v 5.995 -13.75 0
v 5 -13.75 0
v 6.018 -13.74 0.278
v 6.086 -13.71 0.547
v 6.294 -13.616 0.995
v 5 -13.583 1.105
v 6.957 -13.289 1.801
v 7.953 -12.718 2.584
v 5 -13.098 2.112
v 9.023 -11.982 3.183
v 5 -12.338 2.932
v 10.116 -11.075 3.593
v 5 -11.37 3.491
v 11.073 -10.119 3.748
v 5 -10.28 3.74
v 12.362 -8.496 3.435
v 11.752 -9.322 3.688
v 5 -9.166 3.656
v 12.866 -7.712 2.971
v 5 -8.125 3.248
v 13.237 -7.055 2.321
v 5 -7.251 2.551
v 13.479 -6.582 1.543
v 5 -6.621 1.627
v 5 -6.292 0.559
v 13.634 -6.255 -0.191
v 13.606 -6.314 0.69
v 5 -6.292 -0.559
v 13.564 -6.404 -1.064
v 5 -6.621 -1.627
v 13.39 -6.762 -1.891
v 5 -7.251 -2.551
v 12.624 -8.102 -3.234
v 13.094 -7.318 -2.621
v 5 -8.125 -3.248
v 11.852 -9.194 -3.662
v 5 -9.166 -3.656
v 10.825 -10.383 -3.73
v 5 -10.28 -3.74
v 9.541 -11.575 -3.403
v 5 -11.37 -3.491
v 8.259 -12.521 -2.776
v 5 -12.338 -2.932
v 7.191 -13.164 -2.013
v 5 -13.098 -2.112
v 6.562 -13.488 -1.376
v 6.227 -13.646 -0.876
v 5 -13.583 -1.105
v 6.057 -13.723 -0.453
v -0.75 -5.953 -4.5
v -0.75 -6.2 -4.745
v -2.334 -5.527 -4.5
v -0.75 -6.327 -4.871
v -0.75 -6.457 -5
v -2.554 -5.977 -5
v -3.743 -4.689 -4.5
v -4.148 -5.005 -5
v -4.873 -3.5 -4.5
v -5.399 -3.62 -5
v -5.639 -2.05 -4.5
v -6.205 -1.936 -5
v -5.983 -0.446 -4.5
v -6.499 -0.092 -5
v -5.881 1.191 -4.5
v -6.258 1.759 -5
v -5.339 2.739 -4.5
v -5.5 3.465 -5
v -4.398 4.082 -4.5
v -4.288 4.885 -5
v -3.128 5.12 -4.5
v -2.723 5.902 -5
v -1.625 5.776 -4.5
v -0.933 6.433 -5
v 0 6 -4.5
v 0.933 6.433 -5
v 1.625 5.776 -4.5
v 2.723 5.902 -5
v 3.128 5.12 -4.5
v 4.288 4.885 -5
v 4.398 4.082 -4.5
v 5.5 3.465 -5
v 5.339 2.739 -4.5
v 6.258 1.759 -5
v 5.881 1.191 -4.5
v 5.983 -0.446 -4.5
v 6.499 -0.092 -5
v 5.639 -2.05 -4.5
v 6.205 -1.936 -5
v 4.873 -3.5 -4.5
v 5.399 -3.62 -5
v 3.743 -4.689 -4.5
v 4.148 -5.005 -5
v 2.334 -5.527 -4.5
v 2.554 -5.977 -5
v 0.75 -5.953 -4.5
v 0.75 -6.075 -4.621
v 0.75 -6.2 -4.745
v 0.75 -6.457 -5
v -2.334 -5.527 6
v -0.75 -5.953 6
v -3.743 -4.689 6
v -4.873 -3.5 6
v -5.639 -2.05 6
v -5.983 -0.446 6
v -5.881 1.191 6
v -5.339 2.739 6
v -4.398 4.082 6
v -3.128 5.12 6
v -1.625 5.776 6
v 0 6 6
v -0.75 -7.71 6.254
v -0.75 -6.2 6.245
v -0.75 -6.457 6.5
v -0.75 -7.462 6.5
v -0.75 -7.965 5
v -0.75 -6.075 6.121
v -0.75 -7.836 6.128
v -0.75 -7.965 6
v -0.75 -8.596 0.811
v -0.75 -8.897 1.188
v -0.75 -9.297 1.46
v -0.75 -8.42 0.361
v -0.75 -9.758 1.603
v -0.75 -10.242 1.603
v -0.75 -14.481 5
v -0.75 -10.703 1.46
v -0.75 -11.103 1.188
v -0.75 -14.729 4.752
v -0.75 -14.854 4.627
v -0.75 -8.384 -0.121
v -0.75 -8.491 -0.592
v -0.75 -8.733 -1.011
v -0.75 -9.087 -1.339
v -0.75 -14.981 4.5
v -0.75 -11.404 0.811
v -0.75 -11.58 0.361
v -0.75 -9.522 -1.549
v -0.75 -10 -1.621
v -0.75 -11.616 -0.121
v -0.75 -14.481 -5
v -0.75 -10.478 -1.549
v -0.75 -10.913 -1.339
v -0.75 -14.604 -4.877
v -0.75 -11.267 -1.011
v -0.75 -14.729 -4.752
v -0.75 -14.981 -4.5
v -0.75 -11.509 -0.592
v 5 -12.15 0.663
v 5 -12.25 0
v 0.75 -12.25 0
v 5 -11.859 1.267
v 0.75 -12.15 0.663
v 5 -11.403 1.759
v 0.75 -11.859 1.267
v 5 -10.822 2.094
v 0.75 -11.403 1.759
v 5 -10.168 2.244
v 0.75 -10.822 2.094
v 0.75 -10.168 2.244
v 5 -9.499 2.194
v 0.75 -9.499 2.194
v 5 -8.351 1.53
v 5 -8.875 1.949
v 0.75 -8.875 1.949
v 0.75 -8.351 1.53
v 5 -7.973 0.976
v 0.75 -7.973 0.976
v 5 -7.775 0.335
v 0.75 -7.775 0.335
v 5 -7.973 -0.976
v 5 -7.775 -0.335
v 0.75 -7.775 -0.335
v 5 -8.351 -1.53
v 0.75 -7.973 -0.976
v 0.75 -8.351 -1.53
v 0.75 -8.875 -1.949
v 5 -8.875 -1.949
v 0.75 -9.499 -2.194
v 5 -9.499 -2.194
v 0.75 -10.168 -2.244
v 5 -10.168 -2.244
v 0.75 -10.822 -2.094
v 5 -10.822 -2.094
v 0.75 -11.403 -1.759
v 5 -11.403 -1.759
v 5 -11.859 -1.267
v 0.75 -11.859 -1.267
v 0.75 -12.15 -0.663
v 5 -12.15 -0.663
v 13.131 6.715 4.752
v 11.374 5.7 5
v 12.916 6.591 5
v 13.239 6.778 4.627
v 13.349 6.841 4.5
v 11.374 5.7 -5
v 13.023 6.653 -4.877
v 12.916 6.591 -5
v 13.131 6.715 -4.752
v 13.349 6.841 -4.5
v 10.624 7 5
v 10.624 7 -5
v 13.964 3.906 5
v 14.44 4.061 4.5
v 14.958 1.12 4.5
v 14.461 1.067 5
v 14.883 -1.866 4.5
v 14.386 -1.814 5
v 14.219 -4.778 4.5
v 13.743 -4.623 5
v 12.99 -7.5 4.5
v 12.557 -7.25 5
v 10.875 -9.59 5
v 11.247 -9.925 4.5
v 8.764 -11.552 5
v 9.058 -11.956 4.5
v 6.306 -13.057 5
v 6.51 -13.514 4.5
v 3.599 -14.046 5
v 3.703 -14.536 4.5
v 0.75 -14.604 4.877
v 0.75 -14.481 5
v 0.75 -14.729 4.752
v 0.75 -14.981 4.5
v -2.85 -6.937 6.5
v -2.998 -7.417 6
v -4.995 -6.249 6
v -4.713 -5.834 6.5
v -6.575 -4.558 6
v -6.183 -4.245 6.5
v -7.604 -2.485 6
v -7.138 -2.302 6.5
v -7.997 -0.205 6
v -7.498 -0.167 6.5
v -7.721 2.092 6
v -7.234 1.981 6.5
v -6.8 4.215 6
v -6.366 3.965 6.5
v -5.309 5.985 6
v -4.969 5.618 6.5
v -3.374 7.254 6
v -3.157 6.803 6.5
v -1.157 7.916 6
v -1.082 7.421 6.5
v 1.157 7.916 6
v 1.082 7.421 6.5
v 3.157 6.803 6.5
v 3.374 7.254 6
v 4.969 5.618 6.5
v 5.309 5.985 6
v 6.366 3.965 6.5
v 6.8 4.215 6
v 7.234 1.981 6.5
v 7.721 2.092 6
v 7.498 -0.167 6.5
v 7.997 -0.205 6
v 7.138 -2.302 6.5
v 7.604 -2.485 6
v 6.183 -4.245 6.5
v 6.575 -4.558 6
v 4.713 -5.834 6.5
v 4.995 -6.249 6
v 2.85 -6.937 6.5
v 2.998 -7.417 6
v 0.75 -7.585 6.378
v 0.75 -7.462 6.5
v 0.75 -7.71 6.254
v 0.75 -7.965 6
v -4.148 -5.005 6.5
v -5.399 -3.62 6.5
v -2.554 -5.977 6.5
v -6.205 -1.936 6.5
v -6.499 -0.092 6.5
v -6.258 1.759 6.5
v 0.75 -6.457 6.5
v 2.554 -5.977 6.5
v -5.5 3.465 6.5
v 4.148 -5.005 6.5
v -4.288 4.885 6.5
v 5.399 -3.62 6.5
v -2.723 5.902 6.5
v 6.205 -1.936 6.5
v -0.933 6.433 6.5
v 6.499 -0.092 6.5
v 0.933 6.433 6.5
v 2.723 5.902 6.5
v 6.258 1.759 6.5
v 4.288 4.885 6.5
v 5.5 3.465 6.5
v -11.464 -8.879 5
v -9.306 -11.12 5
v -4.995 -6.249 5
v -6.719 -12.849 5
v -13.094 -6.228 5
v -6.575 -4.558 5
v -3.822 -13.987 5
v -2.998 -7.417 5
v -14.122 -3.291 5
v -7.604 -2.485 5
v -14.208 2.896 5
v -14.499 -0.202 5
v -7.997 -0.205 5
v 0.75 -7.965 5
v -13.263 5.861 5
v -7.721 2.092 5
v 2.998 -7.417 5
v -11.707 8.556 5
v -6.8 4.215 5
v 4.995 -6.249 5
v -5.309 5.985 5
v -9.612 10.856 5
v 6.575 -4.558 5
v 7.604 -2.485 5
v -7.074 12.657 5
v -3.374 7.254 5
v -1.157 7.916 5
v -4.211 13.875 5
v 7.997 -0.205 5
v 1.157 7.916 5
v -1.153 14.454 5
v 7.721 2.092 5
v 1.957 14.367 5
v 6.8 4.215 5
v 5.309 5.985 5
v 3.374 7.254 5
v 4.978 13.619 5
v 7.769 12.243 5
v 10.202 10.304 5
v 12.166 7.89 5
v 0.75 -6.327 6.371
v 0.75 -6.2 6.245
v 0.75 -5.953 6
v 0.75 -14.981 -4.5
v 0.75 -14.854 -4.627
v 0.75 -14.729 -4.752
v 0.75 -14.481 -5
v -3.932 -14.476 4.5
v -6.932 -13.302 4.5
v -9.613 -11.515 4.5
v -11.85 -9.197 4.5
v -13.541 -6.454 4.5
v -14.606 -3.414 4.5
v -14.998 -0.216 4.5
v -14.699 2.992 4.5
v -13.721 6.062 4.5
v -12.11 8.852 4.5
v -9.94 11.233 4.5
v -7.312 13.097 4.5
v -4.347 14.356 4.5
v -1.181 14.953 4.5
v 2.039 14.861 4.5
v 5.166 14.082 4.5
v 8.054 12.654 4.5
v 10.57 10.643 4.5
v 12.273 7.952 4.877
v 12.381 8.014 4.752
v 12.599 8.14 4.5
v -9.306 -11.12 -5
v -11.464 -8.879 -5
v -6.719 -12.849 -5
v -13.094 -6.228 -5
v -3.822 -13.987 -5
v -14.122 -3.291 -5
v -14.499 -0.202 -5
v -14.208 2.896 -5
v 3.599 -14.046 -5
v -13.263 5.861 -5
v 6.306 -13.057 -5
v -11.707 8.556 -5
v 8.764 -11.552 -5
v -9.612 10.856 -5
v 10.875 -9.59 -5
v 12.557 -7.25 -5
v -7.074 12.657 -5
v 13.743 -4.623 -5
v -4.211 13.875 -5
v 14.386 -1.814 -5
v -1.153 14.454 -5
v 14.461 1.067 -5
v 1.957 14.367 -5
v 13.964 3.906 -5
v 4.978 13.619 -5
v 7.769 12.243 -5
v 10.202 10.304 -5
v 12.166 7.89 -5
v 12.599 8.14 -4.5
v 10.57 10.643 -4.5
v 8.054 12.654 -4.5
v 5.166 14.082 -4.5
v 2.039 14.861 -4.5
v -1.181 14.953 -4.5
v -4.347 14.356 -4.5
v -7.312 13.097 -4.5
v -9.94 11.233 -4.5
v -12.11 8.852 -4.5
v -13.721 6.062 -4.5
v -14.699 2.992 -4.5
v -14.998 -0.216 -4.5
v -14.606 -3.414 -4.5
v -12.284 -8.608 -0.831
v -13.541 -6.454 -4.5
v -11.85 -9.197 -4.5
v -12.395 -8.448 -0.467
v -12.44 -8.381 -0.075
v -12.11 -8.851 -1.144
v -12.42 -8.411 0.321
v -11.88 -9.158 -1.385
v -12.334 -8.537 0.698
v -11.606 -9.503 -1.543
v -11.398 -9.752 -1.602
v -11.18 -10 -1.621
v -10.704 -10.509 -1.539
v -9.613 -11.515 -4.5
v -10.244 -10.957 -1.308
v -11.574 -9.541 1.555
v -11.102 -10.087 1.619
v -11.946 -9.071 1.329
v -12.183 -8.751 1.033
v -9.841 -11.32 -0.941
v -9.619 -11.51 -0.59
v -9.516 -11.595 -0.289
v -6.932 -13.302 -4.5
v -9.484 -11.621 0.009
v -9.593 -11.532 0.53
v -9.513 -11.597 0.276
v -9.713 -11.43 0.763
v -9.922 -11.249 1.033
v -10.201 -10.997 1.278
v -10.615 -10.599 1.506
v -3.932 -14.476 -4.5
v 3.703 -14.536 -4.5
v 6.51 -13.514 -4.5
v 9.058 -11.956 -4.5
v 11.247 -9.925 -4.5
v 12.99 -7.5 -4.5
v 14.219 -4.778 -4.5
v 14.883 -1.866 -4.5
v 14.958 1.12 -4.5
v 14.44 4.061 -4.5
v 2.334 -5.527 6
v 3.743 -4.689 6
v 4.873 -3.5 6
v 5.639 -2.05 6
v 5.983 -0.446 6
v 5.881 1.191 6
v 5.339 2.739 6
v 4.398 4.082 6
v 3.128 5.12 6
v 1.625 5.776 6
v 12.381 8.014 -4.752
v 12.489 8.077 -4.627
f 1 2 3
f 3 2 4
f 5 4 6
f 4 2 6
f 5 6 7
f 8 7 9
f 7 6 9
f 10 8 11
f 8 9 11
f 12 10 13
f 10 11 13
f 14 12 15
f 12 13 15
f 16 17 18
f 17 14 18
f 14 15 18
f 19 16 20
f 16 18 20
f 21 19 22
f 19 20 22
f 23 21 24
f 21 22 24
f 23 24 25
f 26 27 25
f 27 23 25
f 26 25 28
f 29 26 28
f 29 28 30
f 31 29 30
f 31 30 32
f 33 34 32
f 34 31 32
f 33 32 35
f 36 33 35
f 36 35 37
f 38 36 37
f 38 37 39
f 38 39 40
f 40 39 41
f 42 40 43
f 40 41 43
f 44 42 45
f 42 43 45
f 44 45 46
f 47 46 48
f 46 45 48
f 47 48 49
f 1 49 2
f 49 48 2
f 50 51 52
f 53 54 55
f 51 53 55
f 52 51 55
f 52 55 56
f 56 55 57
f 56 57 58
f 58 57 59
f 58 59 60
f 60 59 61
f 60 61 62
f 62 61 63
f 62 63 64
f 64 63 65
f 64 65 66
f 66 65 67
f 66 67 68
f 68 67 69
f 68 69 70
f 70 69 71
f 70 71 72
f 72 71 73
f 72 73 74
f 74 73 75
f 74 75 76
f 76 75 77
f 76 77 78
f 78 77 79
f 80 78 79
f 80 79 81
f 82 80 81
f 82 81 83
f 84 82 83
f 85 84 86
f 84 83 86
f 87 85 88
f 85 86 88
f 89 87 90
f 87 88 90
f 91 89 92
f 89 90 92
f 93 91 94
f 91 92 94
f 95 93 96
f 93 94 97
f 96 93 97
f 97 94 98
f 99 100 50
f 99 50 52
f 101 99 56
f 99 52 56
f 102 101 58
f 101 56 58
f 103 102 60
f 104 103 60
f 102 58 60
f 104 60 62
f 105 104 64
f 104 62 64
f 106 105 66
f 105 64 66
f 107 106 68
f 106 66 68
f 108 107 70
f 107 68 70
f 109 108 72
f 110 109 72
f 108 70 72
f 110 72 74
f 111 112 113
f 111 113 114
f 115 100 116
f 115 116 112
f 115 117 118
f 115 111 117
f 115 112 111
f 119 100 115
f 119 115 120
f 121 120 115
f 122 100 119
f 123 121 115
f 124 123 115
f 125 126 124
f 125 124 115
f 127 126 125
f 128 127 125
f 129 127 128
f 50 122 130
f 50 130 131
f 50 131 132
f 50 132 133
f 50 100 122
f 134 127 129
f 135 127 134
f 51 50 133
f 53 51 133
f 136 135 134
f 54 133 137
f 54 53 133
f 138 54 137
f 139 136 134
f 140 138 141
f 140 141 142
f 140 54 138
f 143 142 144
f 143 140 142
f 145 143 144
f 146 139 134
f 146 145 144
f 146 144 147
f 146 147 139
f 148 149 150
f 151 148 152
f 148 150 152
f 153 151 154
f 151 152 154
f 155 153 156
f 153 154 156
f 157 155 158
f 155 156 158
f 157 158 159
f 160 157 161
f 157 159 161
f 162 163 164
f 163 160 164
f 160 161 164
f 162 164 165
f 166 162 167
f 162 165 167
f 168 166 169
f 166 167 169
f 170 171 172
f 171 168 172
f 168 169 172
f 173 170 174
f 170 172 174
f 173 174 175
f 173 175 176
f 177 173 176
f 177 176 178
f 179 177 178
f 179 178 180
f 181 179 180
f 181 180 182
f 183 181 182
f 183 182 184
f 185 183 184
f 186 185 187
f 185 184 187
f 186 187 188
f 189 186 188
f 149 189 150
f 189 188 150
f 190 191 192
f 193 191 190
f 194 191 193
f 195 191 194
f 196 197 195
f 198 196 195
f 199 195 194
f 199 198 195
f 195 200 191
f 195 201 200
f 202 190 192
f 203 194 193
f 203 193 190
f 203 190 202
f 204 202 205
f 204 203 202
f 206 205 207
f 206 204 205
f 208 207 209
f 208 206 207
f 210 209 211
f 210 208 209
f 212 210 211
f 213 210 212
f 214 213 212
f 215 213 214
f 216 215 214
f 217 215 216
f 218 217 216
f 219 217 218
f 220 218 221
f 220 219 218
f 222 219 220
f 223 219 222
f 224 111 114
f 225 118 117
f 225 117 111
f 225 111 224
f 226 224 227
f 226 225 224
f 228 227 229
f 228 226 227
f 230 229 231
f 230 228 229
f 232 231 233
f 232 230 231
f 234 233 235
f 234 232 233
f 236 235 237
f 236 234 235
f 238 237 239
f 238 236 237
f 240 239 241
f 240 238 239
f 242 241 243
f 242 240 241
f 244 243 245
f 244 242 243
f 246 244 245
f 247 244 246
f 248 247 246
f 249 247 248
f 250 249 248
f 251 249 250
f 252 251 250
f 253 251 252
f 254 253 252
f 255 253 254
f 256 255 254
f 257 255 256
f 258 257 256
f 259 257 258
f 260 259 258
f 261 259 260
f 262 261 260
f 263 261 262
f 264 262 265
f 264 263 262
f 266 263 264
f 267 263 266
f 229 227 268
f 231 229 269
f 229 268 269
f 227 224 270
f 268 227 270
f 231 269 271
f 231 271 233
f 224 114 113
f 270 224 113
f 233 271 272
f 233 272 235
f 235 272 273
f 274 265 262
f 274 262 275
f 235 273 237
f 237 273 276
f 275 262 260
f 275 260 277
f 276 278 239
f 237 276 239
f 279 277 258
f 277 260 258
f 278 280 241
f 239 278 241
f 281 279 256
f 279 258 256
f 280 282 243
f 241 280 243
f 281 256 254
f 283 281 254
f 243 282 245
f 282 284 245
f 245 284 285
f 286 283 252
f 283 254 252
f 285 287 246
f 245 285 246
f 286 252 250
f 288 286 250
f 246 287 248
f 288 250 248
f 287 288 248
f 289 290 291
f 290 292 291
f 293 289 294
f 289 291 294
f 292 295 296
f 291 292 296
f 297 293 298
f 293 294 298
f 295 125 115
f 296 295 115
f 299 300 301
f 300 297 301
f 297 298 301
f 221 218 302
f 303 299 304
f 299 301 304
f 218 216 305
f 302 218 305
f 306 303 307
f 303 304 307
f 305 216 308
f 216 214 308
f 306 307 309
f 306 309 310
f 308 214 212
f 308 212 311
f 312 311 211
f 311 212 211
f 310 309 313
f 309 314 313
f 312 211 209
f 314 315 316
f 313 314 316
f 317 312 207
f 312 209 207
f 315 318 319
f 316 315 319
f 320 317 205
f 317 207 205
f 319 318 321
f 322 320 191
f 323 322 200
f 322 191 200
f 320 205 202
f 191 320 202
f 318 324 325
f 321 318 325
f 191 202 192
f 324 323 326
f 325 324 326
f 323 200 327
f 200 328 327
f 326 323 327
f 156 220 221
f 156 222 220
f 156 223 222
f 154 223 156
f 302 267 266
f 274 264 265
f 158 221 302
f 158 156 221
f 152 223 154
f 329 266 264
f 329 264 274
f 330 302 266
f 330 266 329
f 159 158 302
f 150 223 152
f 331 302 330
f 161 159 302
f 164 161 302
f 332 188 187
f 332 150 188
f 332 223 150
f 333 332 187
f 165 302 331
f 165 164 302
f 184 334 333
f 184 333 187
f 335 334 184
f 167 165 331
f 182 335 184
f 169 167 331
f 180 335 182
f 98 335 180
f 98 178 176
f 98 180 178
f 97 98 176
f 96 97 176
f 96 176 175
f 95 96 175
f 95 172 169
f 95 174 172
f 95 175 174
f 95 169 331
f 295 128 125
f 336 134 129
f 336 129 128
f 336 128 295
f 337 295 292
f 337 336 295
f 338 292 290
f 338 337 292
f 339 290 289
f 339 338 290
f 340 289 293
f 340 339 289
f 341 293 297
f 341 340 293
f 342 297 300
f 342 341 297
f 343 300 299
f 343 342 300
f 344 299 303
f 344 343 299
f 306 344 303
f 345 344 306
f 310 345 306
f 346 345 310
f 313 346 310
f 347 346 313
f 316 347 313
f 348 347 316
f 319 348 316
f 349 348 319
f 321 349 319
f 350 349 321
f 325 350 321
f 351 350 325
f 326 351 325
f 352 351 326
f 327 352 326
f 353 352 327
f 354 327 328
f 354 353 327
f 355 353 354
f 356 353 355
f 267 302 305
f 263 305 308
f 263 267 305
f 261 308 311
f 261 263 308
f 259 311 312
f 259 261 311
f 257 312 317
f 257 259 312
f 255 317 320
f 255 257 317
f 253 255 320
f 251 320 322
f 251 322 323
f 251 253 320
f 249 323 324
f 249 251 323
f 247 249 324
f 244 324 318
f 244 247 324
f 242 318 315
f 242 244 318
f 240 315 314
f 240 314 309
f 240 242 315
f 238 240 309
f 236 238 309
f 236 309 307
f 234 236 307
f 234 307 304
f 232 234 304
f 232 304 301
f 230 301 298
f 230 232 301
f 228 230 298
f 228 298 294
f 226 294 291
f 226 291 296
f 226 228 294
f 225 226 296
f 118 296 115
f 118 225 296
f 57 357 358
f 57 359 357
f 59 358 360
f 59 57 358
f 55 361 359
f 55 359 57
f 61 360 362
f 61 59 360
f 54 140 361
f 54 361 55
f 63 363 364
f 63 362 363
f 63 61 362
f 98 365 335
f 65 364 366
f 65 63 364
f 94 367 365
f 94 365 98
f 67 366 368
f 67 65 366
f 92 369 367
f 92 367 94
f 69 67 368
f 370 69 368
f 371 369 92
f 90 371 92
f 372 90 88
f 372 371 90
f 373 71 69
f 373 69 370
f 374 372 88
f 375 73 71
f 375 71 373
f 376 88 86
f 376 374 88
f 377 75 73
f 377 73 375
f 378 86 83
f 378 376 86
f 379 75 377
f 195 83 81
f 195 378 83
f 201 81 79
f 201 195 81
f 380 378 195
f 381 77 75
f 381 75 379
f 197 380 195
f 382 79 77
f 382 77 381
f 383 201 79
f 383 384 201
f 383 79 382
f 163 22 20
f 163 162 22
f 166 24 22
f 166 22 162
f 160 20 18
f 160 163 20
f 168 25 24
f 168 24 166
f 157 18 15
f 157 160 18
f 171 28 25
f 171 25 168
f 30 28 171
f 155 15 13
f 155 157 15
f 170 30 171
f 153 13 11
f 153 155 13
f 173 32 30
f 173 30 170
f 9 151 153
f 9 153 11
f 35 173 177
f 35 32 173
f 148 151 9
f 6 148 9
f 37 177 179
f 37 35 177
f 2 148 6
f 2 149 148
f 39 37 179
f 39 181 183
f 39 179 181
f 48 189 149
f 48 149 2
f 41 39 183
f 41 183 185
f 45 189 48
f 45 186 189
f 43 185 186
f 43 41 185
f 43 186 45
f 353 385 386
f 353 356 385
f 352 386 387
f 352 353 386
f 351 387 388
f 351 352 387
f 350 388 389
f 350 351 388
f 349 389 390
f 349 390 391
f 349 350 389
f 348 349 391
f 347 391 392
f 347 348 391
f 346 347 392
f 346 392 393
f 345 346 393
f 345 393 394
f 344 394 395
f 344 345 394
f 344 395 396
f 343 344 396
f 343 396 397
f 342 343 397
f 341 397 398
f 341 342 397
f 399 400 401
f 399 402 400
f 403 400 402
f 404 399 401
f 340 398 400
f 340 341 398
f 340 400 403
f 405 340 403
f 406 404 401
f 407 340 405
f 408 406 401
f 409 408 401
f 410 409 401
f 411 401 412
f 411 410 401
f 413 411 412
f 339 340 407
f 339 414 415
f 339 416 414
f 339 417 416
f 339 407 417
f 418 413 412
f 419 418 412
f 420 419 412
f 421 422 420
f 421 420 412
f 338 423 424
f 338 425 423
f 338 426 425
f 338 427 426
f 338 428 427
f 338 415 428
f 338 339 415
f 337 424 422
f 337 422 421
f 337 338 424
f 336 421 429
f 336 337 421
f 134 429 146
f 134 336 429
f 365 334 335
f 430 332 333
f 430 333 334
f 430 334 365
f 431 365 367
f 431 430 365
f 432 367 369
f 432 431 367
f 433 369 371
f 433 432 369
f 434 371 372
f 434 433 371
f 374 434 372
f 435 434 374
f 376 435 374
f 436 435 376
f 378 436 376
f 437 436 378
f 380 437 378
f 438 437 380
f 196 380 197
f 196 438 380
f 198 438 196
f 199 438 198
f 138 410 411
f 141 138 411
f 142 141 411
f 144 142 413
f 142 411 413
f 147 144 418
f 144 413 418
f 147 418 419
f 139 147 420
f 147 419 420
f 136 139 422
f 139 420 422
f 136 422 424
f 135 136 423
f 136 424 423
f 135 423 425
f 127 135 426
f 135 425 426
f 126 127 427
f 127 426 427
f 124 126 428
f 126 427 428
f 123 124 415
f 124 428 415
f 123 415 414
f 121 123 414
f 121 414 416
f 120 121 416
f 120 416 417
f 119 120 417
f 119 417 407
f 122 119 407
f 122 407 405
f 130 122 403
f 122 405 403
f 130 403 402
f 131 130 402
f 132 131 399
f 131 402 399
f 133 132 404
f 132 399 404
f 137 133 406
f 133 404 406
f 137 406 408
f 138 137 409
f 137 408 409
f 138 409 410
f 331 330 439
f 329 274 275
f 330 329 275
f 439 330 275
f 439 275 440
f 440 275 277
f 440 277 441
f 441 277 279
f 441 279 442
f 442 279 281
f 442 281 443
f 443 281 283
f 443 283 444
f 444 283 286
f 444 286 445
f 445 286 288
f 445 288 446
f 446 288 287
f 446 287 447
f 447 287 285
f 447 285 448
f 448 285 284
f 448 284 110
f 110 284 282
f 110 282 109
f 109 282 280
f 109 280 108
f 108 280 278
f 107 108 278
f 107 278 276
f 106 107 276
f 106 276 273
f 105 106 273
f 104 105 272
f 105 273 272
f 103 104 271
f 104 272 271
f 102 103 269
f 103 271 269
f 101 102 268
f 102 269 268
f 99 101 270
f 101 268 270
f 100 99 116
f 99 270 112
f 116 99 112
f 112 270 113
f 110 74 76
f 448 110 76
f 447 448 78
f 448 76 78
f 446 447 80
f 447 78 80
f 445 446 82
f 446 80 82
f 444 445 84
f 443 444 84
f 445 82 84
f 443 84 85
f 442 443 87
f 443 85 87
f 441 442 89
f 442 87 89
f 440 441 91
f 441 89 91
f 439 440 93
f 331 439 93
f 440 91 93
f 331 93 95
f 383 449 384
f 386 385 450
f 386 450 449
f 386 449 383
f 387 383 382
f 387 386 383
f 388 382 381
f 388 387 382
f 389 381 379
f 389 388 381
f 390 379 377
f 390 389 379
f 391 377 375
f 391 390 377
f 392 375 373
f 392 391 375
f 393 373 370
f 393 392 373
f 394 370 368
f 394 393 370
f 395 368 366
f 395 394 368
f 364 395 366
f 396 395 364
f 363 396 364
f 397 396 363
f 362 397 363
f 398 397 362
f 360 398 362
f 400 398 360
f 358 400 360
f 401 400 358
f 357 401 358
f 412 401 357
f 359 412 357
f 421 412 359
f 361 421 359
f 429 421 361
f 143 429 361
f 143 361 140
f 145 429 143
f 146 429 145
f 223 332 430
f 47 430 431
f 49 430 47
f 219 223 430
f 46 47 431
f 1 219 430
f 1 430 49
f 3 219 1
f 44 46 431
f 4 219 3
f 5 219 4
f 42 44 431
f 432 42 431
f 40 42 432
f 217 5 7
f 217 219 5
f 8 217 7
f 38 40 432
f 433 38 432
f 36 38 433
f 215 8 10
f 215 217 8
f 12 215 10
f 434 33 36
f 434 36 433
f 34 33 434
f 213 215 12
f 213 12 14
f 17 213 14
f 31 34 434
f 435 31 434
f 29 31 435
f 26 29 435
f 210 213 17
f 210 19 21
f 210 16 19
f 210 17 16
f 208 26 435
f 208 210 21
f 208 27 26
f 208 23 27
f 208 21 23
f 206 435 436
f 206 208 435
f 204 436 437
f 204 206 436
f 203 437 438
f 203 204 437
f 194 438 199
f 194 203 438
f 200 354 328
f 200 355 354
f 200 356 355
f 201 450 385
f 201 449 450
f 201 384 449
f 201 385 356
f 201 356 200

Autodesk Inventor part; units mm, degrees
sketch "Sketch_1" plane through (0, 0, 0) normal (1, 0, 0) x (0, 1, 0)
  line L0 (0, -5) -> (0, 6.5)
  line L1 (7.5, 6.5) -> (6.5, 6.5)
  line L2 (6.5, 6.5) -> (6, 6)
  line L3 (6, 6) -> (6, -4.5)
  line L4 (6, -4.5) -> (6.5, -5)
  line L5 (6.5, -5) -> (14.5, -5)
  line L6 (14.5, -5) -> (15, -4.5)
  line L7 (15, -4.5) -> (15, 4.5)
  line L8 (15, 4.5) -> (14.5, 5)
  line L9 (14.5, 5) -> (8, 5)
  line L10 (8, 5) -> (8, 6)
  line L11 (8, 6) -> (7.5, 6.5)
revolve "Revolution1" add sketch "Sketch_1" angle 360 about axis through (0, 0, -5) along (0, 0, -1)
sketch "Sketch_2" plane through (0, 0, 0) normal (0, 0, 1) x (1, 0, 0)
  line L0 (-0.75, -15) -> (0.75, -15)
  line L1 (0.75, -15) -> (0.75, 0)
  line L2 (0.75, 0) -> (-0.75, 0)
  line L3 (-0.75, 0) -> (-0.75, -15)
extrude "Extrusion1" cut sketch "Sketch_2" along normal mid plane 23
sketch "Sketch_3" plane through (0, 0, 0) normal (0, 0, 1) x (1, 0, 0)
  line L0 (0, -10) -> (15, -10)
  line L1 (15, -10) -> (15, -13.75)
  line L2 (15, -13.75) -> (5, -13.75)
  line L3 (5, -13.75) -> (5, -12.25)
  line L4 (5, -12.25) -> (0, -12.25)
  line L5 (0, -12.25) -> (0, -10)
  line L6 (0, -10) -> (15, -10)
revolve "Revolution2" cut sketch "Sketch_3" angle 360 about axis through (0, -10, 0) along (1, 0, 0)
sketch "Sketch4" plane through (-0.75, -14.4806, -5) normal (1, 0, 0) x (0, 0, -1)
  point P0 (-5, 4.4806)
hole "Hole1" at (-0.75, -10, 0) direction (-1, 0, 0) diameter 3.242 depth 15 thread size "M4x0.7" class "6H" standard "ISO Metric profile"
sketch "_____1" plane through (0, 0, 0) normal (0, 0, 1) x (1, 0, 0)
  line L0 (10.6235, 6.9995) -> (11.3735, 5.7005)
  line L1 (11.3735, 5.7005) -> (13.3654, 6.8505)
  line L2 (13.3654, 6.8505) -> (12.6154, 8.1495)
  line L3 (12.6154, 8.1495) -> (10.6235, 6.9995)
extrude "Extrusion2" cut sketch "_____1" along normal mid plane 10
ref_plane "body_screw_XY" through (5, -10, 0) normal (1, 0, 0) x (0, 0, -1)
ref_plane "body_screw_YZ" through (5, -10, 0) normal (0, 0, -1) x (0, 1, 0)
ref_plane "body_screw_ZX" through (5, -10, 0) normal (0, 1, 0) x (1, 0, 0)
properties part number "C-SCSBNAW12-16_b"
